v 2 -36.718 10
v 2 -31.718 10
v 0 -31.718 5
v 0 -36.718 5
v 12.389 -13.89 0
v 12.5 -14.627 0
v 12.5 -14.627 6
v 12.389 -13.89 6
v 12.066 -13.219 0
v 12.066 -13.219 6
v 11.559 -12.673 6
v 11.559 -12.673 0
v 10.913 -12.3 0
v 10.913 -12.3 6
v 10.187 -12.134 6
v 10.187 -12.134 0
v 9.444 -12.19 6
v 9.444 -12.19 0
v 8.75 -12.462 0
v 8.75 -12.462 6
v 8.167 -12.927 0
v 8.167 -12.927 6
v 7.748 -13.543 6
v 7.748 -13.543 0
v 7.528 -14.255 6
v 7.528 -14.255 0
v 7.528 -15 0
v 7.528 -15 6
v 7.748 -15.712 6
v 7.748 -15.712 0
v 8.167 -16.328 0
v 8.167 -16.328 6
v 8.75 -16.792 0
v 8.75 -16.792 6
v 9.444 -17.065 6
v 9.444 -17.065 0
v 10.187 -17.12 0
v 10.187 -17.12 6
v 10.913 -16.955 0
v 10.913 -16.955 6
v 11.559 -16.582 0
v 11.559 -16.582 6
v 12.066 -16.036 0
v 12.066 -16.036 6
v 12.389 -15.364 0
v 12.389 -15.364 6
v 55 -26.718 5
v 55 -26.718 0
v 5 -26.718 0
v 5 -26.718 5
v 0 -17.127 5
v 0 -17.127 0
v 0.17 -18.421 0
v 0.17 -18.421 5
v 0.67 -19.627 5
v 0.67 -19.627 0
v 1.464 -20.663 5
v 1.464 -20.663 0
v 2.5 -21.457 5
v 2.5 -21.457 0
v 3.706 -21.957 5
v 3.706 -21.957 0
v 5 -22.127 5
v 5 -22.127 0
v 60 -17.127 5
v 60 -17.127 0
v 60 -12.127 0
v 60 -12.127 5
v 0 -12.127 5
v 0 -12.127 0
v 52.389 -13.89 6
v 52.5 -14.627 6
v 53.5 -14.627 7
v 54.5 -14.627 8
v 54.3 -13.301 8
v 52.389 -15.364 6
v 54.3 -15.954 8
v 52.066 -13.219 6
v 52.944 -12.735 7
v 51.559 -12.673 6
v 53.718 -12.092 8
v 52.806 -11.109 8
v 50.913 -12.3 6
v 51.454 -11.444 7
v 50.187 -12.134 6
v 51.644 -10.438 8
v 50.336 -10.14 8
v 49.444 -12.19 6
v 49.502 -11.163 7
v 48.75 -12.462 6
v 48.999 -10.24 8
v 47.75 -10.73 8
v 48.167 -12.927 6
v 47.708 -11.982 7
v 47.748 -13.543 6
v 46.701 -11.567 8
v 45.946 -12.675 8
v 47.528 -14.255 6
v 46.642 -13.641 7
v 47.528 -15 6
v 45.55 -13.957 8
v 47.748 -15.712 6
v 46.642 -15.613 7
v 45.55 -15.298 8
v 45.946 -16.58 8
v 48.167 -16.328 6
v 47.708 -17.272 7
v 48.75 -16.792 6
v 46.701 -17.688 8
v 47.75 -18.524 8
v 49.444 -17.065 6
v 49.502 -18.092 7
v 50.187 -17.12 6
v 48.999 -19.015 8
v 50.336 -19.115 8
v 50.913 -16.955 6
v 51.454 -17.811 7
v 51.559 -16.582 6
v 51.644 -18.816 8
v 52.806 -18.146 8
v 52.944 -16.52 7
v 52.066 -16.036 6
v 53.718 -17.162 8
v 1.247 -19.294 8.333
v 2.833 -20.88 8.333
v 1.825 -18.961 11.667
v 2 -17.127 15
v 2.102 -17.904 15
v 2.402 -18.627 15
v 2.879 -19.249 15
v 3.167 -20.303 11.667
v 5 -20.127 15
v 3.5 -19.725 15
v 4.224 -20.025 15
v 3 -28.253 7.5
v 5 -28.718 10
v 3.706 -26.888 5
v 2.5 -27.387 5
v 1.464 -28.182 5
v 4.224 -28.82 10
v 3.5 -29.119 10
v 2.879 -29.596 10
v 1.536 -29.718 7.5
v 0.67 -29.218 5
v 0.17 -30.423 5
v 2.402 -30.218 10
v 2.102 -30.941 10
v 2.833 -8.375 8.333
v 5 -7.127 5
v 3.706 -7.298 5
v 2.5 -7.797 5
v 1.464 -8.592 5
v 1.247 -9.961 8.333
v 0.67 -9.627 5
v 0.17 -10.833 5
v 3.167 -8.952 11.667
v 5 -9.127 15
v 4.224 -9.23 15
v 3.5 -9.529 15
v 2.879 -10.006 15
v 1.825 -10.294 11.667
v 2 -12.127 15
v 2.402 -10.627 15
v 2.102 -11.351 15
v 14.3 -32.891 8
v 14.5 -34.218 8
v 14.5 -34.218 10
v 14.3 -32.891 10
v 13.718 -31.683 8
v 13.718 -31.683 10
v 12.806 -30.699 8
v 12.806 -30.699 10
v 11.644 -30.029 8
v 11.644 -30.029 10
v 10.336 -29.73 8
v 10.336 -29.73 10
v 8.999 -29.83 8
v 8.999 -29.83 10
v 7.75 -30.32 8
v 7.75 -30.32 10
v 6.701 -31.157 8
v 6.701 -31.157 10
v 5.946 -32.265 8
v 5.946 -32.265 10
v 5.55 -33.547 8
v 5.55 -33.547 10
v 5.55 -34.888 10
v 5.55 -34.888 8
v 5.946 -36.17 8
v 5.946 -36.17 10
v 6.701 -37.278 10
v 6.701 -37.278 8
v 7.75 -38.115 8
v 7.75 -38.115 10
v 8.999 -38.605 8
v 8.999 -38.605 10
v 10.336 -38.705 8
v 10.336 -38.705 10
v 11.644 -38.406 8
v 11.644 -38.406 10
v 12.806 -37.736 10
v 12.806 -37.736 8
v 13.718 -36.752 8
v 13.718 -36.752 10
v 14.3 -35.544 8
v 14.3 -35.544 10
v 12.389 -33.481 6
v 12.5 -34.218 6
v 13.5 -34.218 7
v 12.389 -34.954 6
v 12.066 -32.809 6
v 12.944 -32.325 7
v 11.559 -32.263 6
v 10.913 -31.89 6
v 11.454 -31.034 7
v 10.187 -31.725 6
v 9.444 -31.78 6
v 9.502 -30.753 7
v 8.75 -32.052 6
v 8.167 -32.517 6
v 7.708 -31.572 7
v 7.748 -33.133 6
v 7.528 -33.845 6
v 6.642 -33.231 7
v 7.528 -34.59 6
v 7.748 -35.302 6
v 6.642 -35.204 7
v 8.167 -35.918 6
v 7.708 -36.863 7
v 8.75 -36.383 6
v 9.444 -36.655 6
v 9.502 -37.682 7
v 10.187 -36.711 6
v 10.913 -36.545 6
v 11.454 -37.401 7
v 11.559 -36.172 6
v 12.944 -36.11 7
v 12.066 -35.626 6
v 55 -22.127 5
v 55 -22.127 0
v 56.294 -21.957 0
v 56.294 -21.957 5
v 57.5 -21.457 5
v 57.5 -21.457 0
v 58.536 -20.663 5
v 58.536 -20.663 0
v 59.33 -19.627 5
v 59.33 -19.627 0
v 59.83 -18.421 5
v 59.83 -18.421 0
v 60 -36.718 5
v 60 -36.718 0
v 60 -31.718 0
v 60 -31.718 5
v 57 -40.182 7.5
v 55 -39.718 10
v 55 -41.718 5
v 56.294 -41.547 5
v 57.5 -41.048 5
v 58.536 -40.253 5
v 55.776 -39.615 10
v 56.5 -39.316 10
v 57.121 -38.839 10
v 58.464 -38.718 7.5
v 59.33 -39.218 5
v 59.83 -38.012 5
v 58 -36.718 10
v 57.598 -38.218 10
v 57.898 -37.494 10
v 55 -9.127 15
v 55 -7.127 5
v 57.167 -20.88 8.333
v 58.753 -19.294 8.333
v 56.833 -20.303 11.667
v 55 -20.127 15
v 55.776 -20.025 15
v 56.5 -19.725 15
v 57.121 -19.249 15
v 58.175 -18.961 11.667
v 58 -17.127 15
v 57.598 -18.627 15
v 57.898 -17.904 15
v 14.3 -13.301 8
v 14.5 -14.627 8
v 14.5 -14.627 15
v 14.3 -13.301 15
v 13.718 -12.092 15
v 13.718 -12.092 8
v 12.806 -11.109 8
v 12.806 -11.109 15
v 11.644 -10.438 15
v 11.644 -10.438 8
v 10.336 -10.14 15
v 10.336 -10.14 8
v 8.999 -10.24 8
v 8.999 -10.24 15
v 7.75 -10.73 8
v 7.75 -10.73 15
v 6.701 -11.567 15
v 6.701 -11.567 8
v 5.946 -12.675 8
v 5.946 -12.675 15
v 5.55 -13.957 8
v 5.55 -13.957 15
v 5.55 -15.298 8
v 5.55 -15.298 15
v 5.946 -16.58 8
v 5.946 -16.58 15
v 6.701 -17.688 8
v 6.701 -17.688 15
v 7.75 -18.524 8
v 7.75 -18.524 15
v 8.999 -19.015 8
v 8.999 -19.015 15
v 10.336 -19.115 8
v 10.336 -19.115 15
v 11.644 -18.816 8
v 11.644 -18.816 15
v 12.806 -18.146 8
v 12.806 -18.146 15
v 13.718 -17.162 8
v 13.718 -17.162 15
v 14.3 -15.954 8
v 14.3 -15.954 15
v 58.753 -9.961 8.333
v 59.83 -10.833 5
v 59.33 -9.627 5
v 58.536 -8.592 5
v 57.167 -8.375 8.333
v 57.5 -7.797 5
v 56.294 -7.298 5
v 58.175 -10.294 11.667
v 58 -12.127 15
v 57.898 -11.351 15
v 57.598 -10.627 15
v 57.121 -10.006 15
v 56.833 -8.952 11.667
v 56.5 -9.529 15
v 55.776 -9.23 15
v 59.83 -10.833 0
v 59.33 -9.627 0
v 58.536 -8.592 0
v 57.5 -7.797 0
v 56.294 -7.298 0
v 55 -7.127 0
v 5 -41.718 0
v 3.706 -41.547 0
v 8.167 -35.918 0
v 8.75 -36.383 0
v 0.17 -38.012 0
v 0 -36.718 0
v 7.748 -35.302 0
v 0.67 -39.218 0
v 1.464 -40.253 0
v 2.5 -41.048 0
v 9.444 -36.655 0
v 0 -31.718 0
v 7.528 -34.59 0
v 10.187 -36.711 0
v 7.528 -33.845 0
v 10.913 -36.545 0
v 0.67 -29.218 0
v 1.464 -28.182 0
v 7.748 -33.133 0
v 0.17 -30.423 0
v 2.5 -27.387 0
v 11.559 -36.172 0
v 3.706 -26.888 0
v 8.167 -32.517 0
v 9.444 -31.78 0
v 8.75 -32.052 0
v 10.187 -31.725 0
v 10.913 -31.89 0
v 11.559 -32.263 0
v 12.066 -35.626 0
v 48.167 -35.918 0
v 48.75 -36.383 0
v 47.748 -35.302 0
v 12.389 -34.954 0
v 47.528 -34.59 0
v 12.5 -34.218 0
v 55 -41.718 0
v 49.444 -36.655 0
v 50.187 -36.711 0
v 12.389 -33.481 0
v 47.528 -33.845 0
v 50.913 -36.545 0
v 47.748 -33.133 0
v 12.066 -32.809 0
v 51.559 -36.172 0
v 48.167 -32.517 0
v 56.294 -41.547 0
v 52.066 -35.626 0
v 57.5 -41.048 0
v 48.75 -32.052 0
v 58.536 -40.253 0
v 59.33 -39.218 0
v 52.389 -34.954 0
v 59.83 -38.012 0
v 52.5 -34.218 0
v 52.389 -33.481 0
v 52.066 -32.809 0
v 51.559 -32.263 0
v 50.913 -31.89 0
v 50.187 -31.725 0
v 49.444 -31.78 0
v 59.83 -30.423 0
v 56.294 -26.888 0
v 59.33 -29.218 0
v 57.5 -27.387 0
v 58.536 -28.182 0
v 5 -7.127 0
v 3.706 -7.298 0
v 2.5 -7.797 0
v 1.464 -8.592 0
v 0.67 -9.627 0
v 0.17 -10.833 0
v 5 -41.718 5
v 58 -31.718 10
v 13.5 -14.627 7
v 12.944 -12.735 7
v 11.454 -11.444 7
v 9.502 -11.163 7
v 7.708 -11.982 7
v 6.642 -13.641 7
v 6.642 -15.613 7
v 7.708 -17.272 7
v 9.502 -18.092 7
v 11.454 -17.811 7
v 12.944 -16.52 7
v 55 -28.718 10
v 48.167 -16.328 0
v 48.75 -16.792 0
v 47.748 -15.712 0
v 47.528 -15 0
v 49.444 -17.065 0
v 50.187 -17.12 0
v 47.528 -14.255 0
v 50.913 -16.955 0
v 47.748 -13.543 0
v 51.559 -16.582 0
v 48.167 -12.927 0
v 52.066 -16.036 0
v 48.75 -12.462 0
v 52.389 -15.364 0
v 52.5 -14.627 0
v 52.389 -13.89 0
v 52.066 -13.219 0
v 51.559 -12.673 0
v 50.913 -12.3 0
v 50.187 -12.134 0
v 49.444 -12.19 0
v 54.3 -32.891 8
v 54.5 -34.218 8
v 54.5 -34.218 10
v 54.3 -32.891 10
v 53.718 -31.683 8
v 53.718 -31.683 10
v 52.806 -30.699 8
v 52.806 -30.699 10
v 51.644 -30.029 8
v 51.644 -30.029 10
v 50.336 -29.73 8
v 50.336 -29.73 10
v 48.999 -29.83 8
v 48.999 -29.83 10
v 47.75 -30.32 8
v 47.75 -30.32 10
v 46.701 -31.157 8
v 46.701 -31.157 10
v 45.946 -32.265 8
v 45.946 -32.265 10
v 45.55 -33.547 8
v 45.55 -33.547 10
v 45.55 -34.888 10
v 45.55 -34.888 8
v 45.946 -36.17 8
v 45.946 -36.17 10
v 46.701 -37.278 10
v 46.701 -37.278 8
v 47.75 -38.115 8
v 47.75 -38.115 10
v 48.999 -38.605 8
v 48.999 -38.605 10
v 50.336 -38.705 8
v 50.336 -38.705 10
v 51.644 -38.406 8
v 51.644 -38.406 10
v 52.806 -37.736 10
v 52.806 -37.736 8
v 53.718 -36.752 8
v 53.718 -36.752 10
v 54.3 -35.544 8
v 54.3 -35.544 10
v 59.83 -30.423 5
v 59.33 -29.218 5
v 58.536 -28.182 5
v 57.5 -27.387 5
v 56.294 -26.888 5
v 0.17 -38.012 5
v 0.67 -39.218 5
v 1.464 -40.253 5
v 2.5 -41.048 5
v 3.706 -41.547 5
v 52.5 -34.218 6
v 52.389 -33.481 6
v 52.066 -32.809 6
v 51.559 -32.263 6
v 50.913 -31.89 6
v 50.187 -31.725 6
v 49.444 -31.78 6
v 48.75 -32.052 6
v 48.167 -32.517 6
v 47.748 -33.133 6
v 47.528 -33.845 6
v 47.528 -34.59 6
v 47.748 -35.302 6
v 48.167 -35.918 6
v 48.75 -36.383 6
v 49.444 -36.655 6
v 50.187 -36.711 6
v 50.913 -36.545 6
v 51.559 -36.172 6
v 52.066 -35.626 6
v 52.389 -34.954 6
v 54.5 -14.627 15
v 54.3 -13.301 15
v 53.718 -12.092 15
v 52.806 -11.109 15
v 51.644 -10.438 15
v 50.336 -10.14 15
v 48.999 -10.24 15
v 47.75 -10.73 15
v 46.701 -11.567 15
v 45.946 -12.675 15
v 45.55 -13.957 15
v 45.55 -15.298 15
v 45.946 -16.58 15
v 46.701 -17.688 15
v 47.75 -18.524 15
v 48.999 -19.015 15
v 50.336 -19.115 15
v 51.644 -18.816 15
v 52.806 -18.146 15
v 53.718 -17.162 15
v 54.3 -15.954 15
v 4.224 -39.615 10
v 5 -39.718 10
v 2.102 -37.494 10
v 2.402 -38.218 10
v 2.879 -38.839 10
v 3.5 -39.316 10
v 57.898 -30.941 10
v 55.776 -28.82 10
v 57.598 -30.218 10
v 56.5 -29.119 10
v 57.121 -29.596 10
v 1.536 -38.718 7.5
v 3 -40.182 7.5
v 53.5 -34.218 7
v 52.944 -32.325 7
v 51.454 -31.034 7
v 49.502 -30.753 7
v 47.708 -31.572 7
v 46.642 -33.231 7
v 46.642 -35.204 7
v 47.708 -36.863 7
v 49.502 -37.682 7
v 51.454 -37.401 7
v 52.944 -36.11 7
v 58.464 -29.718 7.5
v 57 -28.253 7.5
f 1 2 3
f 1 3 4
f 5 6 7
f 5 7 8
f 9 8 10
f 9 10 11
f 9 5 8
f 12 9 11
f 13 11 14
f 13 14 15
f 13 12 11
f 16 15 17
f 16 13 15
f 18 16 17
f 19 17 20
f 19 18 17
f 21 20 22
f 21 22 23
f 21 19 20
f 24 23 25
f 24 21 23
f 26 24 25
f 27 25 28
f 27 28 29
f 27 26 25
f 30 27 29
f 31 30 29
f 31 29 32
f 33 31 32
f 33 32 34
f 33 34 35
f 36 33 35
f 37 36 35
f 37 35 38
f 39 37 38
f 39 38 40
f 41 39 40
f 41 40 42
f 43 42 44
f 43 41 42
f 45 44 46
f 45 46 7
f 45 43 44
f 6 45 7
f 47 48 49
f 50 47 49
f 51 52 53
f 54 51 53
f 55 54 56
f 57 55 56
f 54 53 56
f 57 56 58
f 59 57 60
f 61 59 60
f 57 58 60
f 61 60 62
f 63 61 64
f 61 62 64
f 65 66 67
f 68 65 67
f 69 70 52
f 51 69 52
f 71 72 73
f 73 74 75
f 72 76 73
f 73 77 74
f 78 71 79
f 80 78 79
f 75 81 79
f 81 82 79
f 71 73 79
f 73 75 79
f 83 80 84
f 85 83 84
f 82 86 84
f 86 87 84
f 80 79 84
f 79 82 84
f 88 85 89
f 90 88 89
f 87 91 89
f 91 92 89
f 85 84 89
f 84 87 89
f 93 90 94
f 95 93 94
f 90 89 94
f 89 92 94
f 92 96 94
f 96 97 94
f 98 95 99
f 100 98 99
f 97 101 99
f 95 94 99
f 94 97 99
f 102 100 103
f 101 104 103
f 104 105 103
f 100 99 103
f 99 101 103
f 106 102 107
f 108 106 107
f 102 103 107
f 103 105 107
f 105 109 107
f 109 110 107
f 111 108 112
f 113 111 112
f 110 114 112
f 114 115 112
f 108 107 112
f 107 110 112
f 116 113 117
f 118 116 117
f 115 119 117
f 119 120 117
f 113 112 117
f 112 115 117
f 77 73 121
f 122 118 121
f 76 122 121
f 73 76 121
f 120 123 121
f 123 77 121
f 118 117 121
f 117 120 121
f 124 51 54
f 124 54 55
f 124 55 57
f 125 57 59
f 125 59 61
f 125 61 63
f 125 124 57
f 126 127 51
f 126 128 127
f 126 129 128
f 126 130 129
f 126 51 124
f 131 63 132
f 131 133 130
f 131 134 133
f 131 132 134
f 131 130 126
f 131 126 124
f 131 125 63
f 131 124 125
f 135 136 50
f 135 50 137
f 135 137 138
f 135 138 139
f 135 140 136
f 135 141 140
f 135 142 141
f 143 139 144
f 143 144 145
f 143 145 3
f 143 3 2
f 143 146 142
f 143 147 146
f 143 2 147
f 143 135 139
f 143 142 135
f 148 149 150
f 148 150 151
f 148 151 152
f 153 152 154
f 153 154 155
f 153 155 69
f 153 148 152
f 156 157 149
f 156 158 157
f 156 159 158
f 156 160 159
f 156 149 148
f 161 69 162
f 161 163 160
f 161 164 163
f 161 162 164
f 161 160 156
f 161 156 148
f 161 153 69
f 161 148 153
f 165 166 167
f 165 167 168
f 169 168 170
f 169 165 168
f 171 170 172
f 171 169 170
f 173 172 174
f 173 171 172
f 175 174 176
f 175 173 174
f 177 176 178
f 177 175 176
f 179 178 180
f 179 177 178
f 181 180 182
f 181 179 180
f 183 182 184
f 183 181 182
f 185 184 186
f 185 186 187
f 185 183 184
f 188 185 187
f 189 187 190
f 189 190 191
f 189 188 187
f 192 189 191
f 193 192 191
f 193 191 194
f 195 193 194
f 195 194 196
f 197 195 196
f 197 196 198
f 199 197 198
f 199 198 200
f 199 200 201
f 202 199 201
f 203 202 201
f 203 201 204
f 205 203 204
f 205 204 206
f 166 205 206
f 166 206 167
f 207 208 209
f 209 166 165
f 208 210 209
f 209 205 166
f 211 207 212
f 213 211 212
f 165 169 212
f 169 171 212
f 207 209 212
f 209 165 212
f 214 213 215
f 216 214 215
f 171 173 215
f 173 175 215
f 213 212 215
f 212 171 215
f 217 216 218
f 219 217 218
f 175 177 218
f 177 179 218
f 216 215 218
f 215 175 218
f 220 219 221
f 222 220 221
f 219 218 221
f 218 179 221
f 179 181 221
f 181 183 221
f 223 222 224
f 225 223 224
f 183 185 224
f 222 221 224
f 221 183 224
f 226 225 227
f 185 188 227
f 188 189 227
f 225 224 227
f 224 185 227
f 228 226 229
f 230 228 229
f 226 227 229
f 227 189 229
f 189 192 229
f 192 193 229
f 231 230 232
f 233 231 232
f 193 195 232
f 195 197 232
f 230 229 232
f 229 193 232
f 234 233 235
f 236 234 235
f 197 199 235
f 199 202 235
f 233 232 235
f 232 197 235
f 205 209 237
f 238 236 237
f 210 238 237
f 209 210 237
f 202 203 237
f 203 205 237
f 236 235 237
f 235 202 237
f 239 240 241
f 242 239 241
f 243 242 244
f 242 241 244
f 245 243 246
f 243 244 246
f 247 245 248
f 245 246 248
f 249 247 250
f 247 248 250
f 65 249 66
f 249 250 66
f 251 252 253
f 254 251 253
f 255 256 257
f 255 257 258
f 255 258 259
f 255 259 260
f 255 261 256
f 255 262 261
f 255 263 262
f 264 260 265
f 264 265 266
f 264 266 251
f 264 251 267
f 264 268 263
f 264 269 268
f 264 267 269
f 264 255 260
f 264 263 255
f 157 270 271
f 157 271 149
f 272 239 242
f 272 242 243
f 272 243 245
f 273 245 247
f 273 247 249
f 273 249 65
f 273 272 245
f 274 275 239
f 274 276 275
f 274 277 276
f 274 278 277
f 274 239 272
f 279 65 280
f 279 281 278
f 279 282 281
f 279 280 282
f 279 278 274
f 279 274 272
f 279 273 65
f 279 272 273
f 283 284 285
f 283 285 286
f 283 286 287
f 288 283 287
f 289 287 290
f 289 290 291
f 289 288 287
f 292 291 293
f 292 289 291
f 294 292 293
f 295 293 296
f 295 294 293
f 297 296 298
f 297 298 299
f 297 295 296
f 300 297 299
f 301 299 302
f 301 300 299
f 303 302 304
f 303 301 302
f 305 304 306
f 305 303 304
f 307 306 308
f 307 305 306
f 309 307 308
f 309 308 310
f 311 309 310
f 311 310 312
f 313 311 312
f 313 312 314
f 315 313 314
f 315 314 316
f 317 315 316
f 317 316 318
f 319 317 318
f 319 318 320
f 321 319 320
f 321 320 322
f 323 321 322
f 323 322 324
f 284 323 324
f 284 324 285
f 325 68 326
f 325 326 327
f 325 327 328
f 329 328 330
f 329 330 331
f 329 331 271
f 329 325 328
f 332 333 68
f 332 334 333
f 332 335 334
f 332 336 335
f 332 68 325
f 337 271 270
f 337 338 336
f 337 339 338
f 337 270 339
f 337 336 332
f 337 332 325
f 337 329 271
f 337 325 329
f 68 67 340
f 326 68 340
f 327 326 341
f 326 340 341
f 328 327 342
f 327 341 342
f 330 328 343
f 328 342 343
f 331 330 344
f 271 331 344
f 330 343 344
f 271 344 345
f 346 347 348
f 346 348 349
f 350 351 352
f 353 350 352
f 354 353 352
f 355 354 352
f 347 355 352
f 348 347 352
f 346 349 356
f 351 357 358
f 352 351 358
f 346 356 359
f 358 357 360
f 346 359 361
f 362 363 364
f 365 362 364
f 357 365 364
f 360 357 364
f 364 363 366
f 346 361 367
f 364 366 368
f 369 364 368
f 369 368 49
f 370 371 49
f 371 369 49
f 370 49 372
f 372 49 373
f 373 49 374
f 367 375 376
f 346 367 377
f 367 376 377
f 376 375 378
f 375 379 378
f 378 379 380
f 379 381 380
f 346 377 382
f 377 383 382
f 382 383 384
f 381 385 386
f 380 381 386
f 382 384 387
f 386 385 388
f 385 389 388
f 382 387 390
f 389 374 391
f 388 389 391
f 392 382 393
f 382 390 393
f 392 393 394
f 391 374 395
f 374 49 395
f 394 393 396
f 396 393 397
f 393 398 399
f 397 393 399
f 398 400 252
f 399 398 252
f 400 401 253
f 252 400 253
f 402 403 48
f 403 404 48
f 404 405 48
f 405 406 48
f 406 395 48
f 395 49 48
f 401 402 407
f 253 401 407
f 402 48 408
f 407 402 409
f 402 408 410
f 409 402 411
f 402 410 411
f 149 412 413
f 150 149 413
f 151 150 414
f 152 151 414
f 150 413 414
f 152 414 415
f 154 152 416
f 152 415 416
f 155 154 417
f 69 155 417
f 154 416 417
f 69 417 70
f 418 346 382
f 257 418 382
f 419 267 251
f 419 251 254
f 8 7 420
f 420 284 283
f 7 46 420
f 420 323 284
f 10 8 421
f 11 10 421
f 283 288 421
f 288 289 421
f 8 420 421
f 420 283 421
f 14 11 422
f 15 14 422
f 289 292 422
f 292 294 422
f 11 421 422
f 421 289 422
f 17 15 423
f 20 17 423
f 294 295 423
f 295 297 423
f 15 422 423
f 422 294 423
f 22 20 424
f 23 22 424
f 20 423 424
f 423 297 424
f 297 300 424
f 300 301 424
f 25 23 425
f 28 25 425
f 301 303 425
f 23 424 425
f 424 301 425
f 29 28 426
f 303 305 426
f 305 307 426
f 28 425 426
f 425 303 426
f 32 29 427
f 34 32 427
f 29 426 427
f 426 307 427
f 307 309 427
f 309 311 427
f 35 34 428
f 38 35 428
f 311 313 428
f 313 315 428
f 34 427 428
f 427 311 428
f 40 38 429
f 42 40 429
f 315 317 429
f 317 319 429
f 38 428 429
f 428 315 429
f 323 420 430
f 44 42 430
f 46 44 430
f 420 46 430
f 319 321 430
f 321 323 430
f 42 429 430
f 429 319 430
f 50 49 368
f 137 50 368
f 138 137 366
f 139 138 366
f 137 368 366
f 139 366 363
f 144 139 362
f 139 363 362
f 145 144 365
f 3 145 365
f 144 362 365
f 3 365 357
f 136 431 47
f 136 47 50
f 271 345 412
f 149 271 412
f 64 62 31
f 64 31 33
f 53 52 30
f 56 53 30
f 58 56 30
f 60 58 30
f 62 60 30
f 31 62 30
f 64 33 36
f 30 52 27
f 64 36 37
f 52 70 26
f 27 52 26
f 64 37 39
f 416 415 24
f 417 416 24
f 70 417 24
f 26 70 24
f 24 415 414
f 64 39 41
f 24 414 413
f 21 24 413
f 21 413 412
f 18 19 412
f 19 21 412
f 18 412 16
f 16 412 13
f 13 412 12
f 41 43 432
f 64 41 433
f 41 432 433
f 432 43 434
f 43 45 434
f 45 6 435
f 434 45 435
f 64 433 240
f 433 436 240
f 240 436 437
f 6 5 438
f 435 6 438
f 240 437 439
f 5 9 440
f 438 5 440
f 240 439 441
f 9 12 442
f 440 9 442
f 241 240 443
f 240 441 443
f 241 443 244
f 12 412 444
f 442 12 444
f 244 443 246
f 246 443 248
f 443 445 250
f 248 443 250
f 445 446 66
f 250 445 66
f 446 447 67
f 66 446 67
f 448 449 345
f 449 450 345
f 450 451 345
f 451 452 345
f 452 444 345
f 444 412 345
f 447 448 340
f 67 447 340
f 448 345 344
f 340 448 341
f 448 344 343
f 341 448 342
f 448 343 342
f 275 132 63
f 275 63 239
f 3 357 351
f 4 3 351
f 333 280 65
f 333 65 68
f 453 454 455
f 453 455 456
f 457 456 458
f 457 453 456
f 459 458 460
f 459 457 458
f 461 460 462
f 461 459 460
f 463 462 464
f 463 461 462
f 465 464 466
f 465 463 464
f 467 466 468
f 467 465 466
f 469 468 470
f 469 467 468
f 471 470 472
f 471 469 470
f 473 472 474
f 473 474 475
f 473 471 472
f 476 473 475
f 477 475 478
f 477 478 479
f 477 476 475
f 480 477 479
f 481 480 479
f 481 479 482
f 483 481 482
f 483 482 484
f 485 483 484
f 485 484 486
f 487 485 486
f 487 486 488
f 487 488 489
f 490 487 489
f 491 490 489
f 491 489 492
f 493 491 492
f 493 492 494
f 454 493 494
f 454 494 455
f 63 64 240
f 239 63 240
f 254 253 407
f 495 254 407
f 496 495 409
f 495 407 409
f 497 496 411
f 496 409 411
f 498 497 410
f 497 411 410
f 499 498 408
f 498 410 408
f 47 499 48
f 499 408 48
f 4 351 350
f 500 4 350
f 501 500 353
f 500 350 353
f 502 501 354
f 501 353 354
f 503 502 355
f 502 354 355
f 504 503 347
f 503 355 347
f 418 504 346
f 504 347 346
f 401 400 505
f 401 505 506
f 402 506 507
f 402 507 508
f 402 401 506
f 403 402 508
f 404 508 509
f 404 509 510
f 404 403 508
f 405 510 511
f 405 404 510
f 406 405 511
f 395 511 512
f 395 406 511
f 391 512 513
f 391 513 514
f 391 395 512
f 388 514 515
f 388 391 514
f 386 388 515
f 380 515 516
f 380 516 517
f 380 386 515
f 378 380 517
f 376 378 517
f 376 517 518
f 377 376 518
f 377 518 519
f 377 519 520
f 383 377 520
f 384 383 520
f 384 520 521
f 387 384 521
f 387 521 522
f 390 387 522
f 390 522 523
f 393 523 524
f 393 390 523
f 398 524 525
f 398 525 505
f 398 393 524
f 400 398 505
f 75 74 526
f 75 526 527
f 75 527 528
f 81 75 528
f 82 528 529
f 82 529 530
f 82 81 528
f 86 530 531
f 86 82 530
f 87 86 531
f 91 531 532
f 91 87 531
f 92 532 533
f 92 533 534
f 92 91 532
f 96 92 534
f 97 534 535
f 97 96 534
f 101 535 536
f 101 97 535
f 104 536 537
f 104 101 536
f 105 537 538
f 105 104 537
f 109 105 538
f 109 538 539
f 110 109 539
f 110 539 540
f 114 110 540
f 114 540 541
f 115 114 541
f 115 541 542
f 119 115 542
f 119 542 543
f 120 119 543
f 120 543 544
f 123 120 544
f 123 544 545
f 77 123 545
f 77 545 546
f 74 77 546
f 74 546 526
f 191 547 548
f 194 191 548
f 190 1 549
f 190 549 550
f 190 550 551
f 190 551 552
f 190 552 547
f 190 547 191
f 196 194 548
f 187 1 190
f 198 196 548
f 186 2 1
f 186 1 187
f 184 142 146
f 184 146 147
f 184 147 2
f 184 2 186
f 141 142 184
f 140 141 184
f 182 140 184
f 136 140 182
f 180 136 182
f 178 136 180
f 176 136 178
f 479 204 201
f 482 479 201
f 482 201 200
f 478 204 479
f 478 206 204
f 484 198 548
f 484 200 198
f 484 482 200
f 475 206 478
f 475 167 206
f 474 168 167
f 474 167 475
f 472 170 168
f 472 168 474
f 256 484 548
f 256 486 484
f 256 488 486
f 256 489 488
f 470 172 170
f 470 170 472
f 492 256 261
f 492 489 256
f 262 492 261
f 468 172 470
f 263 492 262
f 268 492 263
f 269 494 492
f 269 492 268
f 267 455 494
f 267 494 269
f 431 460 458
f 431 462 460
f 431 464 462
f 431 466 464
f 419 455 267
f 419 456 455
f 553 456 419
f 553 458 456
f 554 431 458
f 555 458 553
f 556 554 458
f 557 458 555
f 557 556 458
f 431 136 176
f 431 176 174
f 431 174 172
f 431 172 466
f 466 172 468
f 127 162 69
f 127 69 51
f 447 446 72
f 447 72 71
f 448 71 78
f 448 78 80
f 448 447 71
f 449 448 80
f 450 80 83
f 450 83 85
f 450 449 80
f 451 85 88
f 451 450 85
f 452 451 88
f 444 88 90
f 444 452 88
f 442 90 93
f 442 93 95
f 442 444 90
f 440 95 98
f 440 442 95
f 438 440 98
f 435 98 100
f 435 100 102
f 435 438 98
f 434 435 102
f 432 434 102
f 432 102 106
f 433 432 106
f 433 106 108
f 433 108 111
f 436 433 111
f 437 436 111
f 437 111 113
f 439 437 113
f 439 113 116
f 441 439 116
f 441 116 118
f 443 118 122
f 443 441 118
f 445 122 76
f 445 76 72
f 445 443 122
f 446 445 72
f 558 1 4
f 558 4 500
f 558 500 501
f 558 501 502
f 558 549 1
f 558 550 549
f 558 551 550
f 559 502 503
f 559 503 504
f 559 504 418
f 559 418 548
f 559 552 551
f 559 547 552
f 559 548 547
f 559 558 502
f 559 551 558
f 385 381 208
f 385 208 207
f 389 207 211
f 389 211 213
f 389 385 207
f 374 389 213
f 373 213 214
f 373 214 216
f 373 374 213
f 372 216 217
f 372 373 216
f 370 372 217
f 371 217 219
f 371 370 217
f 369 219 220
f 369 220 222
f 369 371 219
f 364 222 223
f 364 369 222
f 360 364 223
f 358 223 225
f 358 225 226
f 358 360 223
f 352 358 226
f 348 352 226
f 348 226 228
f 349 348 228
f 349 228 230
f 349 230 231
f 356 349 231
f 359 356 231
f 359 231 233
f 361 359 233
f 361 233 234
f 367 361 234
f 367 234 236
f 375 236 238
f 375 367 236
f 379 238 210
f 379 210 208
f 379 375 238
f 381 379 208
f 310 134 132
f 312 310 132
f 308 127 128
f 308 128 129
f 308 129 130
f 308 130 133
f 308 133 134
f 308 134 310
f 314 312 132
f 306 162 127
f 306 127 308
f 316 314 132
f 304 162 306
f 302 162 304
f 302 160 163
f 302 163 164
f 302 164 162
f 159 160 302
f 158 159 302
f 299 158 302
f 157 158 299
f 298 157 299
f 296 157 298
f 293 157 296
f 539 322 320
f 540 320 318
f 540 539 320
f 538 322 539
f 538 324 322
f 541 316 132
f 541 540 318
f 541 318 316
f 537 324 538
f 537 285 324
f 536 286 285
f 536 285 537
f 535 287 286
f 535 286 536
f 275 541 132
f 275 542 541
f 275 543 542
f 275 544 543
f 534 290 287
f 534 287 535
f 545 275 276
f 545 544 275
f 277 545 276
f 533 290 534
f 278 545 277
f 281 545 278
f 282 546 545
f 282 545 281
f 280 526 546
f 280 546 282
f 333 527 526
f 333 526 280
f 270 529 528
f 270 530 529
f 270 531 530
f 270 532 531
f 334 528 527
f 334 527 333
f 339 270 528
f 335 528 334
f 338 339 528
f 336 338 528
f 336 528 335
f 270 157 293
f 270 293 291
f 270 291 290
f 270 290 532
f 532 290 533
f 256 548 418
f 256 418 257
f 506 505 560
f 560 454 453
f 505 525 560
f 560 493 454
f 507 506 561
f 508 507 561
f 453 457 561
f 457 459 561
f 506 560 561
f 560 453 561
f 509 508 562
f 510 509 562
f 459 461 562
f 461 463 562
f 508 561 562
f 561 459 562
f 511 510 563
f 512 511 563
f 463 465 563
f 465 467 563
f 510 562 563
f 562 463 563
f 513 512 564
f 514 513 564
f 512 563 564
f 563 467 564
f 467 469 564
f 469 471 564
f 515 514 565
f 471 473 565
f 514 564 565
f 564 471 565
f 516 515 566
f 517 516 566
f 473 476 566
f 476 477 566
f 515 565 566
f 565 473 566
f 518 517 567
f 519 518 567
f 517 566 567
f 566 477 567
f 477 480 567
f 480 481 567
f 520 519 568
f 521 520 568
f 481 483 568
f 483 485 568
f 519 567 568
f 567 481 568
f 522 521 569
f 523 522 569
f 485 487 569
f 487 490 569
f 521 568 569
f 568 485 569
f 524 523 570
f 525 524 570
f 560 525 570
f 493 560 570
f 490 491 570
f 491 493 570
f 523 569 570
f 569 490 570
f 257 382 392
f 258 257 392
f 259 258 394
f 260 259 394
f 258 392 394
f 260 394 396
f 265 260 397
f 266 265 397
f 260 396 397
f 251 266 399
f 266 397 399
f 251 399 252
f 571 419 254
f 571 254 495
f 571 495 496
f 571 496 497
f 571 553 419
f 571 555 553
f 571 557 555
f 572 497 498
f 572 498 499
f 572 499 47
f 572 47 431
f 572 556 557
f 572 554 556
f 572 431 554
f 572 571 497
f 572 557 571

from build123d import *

# Parameters (mm, degrees)
F0_R      = 4.5
F1_DEPTH  = 10
F0_R_2    = 2.5
F2_DEPTH  = 8
F3_SIZE2  = 2
F3_SIZE   = 5
F4_SIZE   = 1.99999
F4_2_SIZE = 1.99999
F4_3_SIZE = 1.99999
F5_DEPTH  = 15
F6_SIZE2  = 2
F6_SIZE   = 10


# Not quite as in the source:
# - a fillet or chamfer is up to 0.001 mm smaller than in the source, because OpenCascade refuses the exact size
# - a feature names something its author has since deleted; it is built from what else it names


with BuildPart() as f1:
    # F0 (on Top) → F1 (new body)
    with BuildSketch(Plane.XY):
        with BuildLine():
            Line((55, -26.7175590992), (5, -26.7175590992))
            ThreePointArc((5, -26.7175590992), (1.4644660941, -28.1820251933), (0, -31.7175590992))
            Line((0, -31.7175590992), (0, -36.7175590992))
            ThreePointArc((0, -36.7175590992), (1.4644660941, -40.2530930051), (5, -41.7175590992))
            Line((5, -41.7175590992), (55, -41.7175590992))
            ThreePointArc((55, -41.7175590992), (58.5355339059, -40.2530930051), (60, -36.7175590992))
            Line((60, -36.7175590992), (60, -31.7175590992))
            ThreePointArc((60, -31.7175590992), (58.5355339059, -28.1820251933), (55, -26.7175590992))
        make_face()
        with Locations((10, -34.2175590992)):
            Circle(F0_R, mode=Mode.SUBTRACT)
        with Locations((50, -34.2175590992)):
            Circle(F0_R, mode=Mode.SUBTRACT)
    extrude(amount=F1_DEPTH)

    # F0 (on Top) → F2 (join)
    with BuildSketch(Plane.XY):
        with Locations((50, -34.2175590992)):
            Circle(F0_R)
        with Locations((50, -34.2175590992)):
            Circle(F0_R_2, mode=Mode.SUBTRACT)
        with Locations((10, -34.2175590992)):
            Circle(F0_R)
        with Locations((10, -34.2175590992)):
            Circle(F0_R_2, mode=Mode.SUBTRACT)
    extrude(amount=F2_DEPTH)

    # F3
    f3_edges = [f1.edges().sort_by_distance(p)[0] for p in [
        (30, -26.717559, 10),
    ]]
    f3_side = f1.faces().sort_by_distance((30, -26.717559, 5))[0]
    chamfer(f3_edges, length=F3_SIZE, length2=F3_SIZE2, reference=f3_side)

    # F4 (size 2 in the source; OpenCascade refuses exactly that, so slightly less here)
    f4_edges = [f1.edges().sort_by_distance(p)[0] for p in [
        (47.5, -34.217559, 8),
        (7.5, -34.217559, 8),
    ]]
    chamfer(f4_edges, length=F4_SIZE)


with BuildPart() as f2:
    # F0 (on Top) → F2, piece 2 (new body)
    with BuildSketch(Plane.XY):
        with Locations((10, -14.6273694187)):
            Circle(F0_R)
        with Locations((10, -14.6273694187)):
            Circle(F0_R_2, mode=Mode.SUBTRACT)
    extrude(amount=F2_DEPTH)

    # F4#2 (size 2 in the source; OpenCascade refuses exactly that, so slightly less here)
    f4_2_edges = [f2.edges().sort_by_distance(p)[0] for p in [
        (7.5, -14.627369, 8),
    ]]
    chamfer(f4_2_edges, length=F4_2_SIZE)



with BuildPart() as f2b:
    # F0 (on Top) → F2, piece 3 (new body)
    with BuildSketch(Plane.XY):
        with Locations((50, -14.6273694187)):
            Circle(F0_R)
        with Locations((50, -14.6273694187)):
            Circle(F0_R_2, mode=Mode.SUBTRACT)
    extrude(amount=F2_DEPTH)

    # F4#3 (size 2 in the source; OpenCascade refuses exactly that, so slightly less here)
    f4_3_edges = [f2b.edges().sort_by_distance(p)[0] for p in [
        (47.5, -14.627369, 8),
    ]]
    chamfer(f4_3_edges, length=F4_3_SIZE)


with BuildPart() as f2_1:
    add(f2.part)

    add(f2b.part)  # F5 merges F2b
    # F0 (on Top) → F5 (join)
    with BuildSketch(Plane.XY):
        with BuildLine():
            Line((55, -7.1273694187), (5, -7.1273694187))
            ThreePointArc((5, -7.1273694187), (1.4644660941, -8.5918355128), (0, -12.1273694187))
            Line((0, -12.1273694187), (0, -17.1273694187))
            ThreePointArc((0, -17.1273694187), (1.4644660941, -20.6629033247), (5, -22.1273694187))
            Line((5, -22.1273694187), (55, -22.1273694187))
            ThreePointArc((55, -22.1273694187), (58.5355339059, -20.6629033247), (60, -17.1273694187))
            Line((60, -17.1273694187), (60, -12.1273694187))
            ThreePointArc((60, -12.1273694187), (58.5355339059, -8.5918355128), (55, -7.1273694187))
        make_face()
        with Locations((10, -14.6273694187)):
            Circle(F0_R, mode=Mode.SUBTRACT)
        with Locations((50, -14.6273694187)):
            Circle(F0_R, mode=Mode.SUBTRACT)
    extrude(amount=F5_DEPTH)

    # F6
    f6_edges = [f2_1.edges().sort_by_distance(p)[0] for p in [
        (30, -7.127369, 15),
    ]]
    f6_side = f2_1.faces().sort_by_distance((30, -7.127369, 7.5))[0]
    chamfer(f6_edges, length=F6_SIZE, length2=F6_SIZE2, reference=f6_side)


solid = Compound([f1.part, f2_1.part])
